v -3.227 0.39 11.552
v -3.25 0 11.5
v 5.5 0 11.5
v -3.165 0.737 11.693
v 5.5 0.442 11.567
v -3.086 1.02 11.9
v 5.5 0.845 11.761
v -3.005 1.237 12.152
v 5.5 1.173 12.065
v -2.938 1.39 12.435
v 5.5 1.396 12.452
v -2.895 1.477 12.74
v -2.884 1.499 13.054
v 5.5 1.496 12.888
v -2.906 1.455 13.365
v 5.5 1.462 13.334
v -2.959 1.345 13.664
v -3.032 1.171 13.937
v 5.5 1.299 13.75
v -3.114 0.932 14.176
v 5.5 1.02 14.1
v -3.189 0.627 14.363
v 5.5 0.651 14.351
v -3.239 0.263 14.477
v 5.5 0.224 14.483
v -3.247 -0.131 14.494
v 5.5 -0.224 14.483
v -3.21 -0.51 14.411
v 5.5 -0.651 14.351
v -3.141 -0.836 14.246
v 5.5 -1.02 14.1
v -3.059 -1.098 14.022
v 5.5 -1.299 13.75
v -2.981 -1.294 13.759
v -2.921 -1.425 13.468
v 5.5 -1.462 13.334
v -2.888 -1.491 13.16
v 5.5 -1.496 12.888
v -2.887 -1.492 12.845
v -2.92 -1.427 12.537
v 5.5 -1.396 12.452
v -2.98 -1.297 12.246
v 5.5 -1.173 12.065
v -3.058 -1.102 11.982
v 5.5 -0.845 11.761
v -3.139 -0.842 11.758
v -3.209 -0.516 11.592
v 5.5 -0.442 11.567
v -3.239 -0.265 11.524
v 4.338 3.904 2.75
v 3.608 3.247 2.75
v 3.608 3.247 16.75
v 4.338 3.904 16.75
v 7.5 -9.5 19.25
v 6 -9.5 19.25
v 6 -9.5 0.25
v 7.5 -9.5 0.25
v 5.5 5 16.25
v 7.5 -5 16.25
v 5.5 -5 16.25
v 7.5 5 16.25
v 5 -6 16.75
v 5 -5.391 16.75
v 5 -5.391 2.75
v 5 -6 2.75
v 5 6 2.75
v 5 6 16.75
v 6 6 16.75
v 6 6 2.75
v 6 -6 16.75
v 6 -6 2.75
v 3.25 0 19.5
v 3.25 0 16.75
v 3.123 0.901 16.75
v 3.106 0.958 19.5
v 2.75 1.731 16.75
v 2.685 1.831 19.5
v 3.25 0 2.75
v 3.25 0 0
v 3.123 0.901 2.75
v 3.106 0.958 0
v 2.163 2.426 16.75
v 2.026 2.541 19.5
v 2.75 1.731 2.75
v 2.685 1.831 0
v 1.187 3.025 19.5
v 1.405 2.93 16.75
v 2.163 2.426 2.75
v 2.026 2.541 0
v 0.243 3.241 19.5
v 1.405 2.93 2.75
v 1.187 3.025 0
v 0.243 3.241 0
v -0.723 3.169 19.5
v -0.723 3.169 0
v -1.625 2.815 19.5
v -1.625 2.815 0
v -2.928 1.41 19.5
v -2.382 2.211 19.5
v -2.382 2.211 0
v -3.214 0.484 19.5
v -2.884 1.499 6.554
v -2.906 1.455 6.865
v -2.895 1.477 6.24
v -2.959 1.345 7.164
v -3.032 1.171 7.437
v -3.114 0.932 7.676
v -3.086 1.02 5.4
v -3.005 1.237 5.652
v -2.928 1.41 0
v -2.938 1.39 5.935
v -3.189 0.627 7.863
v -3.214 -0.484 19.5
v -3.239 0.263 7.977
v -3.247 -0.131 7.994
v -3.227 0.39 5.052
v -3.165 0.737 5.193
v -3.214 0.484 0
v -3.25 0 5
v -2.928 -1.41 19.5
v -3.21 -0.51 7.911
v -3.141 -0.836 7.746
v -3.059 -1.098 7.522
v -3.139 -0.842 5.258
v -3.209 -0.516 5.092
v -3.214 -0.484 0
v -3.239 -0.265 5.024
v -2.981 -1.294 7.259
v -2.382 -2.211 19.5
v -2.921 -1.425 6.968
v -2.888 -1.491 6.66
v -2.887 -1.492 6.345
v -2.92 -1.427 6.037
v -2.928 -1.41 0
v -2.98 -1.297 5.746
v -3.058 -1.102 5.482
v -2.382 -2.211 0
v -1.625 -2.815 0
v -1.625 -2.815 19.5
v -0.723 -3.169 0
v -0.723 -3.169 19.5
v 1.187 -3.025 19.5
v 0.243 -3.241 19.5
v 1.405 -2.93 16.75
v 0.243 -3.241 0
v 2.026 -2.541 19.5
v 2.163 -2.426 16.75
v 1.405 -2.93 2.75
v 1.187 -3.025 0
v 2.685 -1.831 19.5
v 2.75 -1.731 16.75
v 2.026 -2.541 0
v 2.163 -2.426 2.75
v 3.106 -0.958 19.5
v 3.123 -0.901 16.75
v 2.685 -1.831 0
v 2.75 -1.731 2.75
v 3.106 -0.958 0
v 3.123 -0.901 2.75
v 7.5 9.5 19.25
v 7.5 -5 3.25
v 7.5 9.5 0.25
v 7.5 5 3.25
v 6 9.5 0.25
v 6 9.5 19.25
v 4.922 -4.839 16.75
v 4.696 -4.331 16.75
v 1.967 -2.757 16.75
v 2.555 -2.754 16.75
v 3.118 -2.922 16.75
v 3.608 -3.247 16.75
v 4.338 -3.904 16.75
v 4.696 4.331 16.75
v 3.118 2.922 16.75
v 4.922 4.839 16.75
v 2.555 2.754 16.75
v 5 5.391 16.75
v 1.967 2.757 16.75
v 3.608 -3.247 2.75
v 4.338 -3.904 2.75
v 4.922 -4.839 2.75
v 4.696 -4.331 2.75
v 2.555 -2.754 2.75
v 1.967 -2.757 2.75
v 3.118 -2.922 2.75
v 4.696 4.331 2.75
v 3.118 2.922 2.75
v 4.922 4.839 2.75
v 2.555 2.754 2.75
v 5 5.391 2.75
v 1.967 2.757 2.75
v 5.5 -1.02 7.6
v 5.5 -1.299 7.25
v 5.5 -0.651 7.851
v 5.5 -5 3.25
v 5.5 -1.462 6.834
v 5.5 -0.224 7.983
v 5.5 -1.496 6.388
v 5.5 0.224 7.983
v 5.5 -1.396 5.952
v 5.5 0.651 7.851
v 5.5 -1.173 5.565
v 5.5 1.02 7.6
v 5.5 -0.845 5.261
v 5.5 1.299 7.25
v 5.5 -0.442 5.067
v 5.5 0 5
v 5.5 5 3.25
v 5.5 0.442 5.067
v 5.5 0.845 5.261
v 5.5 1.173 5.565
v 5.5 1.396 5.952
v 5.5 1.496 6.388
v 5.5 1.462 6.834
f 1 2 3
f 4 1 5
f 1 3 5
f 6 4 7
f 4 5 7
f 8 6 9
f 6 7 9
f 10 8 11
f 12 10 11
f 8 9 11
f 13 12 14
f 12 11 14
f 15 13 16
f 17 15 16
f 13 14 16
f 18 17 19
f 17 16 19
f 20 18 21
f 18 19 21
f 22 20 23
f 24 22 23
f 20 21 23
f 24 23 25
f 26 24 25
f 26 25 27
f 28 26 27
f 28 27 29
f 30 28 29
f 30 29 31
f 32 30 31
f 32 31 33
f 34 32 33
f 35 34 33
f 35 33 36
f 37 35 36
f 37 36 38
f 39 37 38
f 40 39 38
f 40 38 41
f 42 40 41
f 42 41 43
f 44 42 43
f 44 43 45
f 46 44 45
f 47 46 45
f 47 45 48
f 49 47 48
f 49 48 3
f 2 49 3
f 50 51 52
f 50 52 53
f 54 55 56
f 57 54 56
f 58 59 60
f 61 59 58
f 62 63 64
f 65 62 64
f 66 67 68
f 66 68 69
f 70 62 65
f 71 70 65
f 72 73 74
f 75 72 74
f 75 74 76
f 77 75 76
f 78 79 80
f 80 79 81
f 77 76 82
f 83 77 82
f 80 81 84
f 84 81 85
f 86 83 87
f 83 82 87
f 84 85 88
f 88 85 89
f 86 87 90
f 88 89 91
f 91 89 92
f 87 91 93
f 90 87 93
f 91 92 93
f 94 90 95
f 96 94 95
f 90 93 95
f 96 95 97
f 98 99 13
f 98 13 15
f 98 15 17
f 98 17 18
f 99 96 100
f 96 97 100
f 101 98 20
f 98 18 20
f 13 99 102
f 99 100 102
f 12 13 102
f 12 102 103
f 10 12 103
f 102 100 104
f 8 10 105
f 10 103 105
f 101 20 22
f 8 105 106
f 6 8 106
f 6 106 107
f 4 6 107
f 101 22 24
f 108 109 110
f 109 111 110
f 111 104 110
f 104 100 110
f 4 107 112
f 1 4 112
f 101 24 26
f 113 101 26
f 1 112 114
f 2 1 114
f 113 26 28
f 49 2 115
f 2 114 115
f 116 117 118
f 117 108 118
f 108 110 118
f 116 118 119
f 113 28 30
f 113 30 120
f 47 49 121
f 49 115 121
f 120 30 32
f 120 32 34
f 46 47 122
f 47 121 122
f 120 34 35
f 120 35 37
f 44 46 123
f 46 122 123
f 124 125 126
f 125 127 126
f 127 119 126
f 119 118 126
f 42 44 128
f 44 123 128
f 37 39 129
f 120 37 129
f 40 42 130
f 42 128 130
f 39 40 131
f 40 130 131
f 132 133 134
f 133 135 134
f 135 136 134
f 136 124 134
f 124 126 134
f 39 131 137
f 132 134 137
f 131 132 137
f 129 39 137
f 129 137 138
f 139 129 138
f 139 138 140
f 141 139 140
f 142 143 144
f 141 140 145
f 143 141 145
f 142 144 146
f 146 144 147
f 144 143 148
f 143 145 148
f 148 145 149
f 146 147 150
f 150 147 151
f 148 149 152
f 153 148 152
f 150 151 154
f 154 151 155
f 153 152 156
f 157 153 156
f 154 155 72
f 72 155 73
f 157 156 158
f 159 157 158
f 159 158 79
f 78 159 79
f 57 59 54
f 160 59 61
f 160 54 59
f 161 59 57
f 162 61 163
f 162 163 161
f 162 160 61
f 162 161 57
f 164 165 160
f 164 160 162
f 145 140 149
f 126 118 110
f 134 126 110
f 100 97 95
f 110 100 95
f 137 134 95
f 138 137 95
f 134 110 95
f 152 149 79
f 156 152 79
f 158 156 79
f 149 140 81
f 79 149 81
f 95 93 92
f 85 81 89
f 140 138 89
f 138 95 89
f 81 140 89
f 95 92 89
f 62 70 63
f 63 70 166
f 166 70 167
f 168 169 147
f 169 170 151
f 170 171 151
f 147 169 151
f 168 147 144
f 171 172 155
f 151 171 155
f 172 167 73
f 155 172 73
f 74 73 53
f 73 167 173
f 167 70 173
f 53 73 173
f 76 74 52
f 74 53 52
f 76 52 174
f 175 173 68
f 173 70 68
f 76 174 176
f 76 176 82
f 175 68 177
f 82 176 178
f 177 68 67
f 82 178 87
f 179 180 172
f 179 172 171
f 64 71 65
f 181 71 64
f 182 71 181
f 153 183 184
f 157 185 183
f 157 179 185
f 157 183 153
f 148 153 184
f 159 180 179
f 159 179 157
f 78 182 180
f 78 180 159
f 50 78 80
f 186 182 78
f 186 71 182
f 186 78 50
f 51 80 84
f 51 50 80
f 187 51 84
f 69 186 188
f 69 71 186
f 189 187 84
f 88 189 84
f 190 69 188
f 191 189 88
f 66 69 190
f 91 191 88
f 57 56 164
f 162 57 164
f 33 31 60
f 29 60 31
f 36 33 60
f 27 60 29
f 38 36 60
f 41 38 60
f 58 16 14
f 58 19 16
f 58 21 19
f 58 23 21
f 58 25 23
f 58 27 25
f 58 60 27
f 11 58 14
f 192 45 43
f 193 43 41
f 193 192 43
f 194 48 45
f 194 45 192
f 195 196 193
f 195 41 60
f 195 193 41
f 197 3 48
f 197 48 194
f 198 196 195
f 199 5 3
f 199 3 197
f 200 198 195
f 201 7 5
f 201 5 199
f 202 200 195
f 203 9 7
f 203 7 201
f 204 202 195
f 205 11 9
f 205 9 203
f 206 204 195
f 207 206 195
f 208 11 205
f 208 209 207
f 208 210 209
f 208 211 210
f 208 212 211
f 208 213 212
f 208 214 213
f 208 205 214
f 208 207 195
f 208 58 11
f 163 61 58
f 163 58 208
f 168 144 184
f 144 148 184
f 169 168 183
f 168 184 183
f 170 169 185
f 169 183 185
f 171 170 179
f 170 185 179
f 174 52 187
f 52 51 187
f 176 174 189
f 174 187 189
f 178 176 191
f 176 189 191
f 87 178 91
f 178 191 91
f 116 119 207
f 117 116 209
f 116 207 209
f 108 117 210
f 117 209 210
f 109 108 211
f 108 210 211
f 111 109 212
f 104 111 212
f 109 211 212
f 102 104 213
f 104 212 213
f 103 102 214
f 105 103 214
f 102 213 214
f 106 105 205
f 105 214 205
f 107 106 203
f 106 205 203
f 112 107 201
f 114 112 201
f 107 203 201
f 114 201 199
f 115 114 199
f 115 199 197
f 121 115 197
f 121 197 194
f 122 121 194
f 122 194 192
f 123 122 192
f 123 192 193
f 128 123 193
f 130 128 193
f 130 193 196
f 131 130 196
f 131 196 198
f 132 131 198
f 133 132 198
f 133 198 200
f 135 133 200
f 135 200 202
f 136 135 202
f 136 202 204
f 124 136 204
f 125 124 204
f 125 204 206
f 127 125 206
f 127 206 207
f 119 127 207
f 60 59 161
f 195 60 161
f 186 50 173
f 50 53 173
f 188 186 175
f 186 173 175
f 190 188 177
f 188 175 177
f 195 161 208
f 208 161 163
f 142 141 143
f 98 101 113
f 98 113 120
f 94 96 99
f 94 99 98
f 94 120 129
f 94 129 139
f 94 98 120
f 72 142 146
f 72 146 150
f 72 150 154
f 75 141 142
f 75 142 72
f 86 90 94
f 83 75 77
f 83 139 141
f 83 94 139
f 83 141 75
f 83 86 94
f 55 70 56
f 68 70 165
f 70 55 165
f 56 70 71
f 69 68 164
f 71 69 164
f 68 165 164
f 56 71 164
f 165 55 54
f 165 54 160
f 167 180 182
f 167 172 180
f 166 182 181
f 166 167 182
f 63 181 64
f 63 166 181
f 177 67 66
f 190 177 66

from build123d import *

# Parameters (mm, degrees)
SKETCH_1_R          = 3.25
EXTRUDE_1_DEPTH     = 19.5
SKETCH_2_W          = 14
SKETCH_2_H          = 12
EXTRUDE_2_DEPTH     = 1
EXTRUDE_3_DEPTH     = 14
FILLET_1_R          = 2
SKETCH_5_W          = 19
SKETCH_5_H          = 19
EXTRUDE_4_DEPTH     = 1.5
SKETCH_6_R          = 1.5
CUT_EXTRUDE_1_DEPTH = 11.75
SKETCH_7_W          = 13
SKETCH_7_H          = 10
CUT_EXTRUDE_2_DEPTH = 2


with BuildPart() as part:
    # ｽｹｯﾁ1 → ﾎﾞｽ - 押し出し1 (new body)
    with BuildSketch(Plane.XY):
        Circle(SKETCH_1_R)
    extrude(amount=EXTRUDE_1_DEPTH)



with BuildPart() as body_2:
    # ｽｹｯﾁ2 → ﾎﾞｽ - 押し出し2 (new body)
    with BuildSketch(Plane(origin=(5, 0, 0), x_dir=(0, 0, -1), z_dir=(1, 0, 0))):
        with Locations((-9.75, 0)):
            Rectangle(SKETCH_2_W, SKETCH_2_H)
    extrude(amount=EXTRUDE_2_DEPTH)


with BuildPart() as part_1:
    add(part.part)

    add(body_2.part)  # ﾎﾞｽ - 押し出し3 merges body 2
    # ｽｹｯﾁ3 → ﾎﾞｽ - 押し出し3 (add)
    with BuildSketch(Plane(origin=(0, 0, 2.75), x_dir=(-1, 0, 0), z_dir=(0, 0, -1))):
        Polygon((0, 0), (-5, 4.5), (-5, -4.5), align=None)
    extrude(amount=-EXTRUDE_3_DEPTH)

    # ﾌｨﾚｯﾄ1
    fillet_1_edges = [part_1.edges().sort_by_distance(p)[0] for p in [
        (2.415705975, 2.174135378, 9.75),
        (2.415705975, -2.174135378, 9.75),
        (5, 4.5, 9.75),
        (5, -4.5, 9.75),
    ]]
    fillet(fillet_1_edges, radius=FILLET_1_R)

    # ｽｹｯﾁ5 → ﾎﾞｽ - 押し出し4 (add)
    with BuildSketch(Plane(origin=(6, 0, 0), x_dir=(0, 0, -1), z_dir=(1, 0, 0))):
        with Locations((-9.75, 0)):
            Rectangle(SKETCH_5_W, SKETCH_5_H)
    extrude(amount=EXTRUDE_4_DEPTH)

    # ｽｹｯﾁ6 → ｶｯﾄ - 押し出し1 (cut, through all)
    with BuildSketch(Plane(origin=(7.5, 0, 0), x_dir=(0, 0, -1), z_dir=(1, 0, 0))):
        with Locations((-13, 0)):
            Circle(SKETCH_6_R)
        with Locations((-6.5, 0)):
            Circle(SKETCH_6_R)
    extrude(amount=-CUT_EXTRUDE_1_DEPTH, mode=Mode.SUBTRACT)

    # ｽｹｯﾁ7 → ｶｯﾄ - 押し出し2 (cut)
    with BuildSketch(Plane(origin=(7.5, 0, 0), x_dir=(0, 0, -1), z_dir=(1, 0, 0))):
        with Locations((-9.75, 0)):
            Rectangle(SKETCH_7_W, SKETCH_7_H)
    extrude(amount=-CUT_EXTRUDE_2_DEPTH, mode=Mode.SUBTRACT)


solid = part_1.part
